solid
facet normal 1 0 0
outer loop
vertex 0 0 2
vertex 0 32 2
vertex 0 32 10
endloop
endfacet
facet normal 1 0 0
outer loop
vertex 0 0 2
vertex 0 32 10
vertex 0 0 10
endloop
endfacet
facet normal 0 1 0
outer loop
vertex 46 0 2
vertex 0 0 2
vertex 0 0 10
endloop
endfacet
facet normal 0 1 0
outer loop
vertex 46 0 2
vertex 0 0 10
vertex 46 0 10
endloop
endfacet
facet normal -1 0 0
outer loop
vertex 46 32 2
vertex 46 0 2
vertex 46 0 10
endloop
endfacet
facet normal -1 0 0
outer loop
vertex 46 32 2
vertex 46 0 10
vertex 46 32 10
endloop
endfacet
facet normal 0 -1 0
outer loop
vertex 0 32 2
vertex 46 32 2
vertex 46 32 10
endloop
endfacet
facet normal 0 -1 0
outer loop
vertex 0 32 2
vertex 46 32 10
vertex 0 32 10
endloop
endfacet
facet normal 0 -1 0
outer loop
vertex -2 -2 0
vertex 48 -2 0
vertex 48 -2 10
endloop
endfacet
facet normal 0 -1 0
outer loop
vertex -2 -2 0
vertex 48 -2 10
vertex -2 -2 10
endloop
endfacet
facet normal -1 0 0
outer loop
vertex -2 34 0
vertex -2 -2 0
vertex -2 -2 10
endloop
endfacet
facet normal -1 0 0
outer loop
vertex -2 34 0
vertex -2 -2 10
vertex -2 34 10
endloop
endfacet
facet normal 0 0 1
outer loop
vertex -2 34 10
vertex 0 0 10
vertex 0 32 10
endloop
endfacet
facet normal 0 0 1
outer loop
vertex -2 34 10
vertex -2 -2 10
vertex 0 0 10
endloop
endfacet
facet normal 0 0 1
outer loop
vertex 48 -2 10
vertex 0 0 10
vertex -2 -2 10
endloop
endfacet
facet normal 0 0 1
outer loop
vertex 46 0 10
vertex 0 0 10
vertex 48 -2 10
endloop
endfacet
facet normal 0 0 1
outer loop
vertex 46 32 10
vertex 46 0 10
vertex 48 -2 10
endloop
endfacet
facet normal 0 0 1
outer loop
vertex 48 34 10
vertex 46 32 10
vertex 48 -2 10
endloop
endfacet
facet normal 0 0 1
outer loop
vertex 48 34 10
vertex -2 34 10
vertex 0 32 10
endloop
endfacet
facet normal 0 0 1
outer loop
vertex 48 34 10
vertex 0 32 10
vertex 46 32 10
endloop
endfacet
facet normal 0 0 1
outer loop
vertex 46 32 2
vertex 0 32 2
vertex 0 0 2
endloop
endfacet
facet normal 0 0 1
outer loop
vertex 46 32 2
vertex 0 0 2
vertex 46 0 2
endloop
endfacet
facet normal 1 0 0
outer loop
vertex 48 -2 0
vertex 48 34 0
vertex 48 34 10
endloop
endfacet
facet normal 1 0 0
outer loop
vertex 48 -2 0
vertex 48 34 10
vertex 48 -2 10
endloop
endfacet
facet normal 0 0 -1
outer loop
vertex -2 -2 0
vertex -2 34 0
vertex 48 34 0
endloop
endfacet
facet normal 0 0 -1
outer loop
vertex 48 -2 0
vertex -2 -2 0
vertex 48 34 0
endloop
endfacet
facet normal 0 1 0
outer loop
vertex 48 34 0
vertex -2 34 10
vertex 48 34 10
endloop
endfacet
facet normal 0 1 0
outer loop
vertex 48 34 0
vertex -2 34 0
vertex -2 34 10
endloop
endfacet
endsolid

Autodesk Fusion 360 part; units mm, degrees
sketch "Sketch1" plane through (0, 0, 0) normal (0, 0, 1) x (1, 0, 0)
  line L0 (0, 0) -> (46, 0)
  line L1 (46, 0) -> (46, 32)
  line L2 (46, 32) -> (0, 32)
  line L3 (0, 32) -> (0, 0)
  line L4 (-2, 34) -> (48, 34)
  line L5 (48, 34) -> (48, -2)
  line L6 (48, -2) -> (-2, -2)
  line L7 (-2, -2) -> (-2, 34)
  dimension "d1" = 46
  dimension "d2" = 32
  dimension "d3" = 2
  dimension "d4" = 2
  dimension "d5" = 2
  dimension "d6" = 2
extrude "Extrude1" add sketch "Sketch1" along normal blind 2 contours L0 L1 L2 L3
extrude "Extrude2" add sketch "Sketch1" along normal blind 10
